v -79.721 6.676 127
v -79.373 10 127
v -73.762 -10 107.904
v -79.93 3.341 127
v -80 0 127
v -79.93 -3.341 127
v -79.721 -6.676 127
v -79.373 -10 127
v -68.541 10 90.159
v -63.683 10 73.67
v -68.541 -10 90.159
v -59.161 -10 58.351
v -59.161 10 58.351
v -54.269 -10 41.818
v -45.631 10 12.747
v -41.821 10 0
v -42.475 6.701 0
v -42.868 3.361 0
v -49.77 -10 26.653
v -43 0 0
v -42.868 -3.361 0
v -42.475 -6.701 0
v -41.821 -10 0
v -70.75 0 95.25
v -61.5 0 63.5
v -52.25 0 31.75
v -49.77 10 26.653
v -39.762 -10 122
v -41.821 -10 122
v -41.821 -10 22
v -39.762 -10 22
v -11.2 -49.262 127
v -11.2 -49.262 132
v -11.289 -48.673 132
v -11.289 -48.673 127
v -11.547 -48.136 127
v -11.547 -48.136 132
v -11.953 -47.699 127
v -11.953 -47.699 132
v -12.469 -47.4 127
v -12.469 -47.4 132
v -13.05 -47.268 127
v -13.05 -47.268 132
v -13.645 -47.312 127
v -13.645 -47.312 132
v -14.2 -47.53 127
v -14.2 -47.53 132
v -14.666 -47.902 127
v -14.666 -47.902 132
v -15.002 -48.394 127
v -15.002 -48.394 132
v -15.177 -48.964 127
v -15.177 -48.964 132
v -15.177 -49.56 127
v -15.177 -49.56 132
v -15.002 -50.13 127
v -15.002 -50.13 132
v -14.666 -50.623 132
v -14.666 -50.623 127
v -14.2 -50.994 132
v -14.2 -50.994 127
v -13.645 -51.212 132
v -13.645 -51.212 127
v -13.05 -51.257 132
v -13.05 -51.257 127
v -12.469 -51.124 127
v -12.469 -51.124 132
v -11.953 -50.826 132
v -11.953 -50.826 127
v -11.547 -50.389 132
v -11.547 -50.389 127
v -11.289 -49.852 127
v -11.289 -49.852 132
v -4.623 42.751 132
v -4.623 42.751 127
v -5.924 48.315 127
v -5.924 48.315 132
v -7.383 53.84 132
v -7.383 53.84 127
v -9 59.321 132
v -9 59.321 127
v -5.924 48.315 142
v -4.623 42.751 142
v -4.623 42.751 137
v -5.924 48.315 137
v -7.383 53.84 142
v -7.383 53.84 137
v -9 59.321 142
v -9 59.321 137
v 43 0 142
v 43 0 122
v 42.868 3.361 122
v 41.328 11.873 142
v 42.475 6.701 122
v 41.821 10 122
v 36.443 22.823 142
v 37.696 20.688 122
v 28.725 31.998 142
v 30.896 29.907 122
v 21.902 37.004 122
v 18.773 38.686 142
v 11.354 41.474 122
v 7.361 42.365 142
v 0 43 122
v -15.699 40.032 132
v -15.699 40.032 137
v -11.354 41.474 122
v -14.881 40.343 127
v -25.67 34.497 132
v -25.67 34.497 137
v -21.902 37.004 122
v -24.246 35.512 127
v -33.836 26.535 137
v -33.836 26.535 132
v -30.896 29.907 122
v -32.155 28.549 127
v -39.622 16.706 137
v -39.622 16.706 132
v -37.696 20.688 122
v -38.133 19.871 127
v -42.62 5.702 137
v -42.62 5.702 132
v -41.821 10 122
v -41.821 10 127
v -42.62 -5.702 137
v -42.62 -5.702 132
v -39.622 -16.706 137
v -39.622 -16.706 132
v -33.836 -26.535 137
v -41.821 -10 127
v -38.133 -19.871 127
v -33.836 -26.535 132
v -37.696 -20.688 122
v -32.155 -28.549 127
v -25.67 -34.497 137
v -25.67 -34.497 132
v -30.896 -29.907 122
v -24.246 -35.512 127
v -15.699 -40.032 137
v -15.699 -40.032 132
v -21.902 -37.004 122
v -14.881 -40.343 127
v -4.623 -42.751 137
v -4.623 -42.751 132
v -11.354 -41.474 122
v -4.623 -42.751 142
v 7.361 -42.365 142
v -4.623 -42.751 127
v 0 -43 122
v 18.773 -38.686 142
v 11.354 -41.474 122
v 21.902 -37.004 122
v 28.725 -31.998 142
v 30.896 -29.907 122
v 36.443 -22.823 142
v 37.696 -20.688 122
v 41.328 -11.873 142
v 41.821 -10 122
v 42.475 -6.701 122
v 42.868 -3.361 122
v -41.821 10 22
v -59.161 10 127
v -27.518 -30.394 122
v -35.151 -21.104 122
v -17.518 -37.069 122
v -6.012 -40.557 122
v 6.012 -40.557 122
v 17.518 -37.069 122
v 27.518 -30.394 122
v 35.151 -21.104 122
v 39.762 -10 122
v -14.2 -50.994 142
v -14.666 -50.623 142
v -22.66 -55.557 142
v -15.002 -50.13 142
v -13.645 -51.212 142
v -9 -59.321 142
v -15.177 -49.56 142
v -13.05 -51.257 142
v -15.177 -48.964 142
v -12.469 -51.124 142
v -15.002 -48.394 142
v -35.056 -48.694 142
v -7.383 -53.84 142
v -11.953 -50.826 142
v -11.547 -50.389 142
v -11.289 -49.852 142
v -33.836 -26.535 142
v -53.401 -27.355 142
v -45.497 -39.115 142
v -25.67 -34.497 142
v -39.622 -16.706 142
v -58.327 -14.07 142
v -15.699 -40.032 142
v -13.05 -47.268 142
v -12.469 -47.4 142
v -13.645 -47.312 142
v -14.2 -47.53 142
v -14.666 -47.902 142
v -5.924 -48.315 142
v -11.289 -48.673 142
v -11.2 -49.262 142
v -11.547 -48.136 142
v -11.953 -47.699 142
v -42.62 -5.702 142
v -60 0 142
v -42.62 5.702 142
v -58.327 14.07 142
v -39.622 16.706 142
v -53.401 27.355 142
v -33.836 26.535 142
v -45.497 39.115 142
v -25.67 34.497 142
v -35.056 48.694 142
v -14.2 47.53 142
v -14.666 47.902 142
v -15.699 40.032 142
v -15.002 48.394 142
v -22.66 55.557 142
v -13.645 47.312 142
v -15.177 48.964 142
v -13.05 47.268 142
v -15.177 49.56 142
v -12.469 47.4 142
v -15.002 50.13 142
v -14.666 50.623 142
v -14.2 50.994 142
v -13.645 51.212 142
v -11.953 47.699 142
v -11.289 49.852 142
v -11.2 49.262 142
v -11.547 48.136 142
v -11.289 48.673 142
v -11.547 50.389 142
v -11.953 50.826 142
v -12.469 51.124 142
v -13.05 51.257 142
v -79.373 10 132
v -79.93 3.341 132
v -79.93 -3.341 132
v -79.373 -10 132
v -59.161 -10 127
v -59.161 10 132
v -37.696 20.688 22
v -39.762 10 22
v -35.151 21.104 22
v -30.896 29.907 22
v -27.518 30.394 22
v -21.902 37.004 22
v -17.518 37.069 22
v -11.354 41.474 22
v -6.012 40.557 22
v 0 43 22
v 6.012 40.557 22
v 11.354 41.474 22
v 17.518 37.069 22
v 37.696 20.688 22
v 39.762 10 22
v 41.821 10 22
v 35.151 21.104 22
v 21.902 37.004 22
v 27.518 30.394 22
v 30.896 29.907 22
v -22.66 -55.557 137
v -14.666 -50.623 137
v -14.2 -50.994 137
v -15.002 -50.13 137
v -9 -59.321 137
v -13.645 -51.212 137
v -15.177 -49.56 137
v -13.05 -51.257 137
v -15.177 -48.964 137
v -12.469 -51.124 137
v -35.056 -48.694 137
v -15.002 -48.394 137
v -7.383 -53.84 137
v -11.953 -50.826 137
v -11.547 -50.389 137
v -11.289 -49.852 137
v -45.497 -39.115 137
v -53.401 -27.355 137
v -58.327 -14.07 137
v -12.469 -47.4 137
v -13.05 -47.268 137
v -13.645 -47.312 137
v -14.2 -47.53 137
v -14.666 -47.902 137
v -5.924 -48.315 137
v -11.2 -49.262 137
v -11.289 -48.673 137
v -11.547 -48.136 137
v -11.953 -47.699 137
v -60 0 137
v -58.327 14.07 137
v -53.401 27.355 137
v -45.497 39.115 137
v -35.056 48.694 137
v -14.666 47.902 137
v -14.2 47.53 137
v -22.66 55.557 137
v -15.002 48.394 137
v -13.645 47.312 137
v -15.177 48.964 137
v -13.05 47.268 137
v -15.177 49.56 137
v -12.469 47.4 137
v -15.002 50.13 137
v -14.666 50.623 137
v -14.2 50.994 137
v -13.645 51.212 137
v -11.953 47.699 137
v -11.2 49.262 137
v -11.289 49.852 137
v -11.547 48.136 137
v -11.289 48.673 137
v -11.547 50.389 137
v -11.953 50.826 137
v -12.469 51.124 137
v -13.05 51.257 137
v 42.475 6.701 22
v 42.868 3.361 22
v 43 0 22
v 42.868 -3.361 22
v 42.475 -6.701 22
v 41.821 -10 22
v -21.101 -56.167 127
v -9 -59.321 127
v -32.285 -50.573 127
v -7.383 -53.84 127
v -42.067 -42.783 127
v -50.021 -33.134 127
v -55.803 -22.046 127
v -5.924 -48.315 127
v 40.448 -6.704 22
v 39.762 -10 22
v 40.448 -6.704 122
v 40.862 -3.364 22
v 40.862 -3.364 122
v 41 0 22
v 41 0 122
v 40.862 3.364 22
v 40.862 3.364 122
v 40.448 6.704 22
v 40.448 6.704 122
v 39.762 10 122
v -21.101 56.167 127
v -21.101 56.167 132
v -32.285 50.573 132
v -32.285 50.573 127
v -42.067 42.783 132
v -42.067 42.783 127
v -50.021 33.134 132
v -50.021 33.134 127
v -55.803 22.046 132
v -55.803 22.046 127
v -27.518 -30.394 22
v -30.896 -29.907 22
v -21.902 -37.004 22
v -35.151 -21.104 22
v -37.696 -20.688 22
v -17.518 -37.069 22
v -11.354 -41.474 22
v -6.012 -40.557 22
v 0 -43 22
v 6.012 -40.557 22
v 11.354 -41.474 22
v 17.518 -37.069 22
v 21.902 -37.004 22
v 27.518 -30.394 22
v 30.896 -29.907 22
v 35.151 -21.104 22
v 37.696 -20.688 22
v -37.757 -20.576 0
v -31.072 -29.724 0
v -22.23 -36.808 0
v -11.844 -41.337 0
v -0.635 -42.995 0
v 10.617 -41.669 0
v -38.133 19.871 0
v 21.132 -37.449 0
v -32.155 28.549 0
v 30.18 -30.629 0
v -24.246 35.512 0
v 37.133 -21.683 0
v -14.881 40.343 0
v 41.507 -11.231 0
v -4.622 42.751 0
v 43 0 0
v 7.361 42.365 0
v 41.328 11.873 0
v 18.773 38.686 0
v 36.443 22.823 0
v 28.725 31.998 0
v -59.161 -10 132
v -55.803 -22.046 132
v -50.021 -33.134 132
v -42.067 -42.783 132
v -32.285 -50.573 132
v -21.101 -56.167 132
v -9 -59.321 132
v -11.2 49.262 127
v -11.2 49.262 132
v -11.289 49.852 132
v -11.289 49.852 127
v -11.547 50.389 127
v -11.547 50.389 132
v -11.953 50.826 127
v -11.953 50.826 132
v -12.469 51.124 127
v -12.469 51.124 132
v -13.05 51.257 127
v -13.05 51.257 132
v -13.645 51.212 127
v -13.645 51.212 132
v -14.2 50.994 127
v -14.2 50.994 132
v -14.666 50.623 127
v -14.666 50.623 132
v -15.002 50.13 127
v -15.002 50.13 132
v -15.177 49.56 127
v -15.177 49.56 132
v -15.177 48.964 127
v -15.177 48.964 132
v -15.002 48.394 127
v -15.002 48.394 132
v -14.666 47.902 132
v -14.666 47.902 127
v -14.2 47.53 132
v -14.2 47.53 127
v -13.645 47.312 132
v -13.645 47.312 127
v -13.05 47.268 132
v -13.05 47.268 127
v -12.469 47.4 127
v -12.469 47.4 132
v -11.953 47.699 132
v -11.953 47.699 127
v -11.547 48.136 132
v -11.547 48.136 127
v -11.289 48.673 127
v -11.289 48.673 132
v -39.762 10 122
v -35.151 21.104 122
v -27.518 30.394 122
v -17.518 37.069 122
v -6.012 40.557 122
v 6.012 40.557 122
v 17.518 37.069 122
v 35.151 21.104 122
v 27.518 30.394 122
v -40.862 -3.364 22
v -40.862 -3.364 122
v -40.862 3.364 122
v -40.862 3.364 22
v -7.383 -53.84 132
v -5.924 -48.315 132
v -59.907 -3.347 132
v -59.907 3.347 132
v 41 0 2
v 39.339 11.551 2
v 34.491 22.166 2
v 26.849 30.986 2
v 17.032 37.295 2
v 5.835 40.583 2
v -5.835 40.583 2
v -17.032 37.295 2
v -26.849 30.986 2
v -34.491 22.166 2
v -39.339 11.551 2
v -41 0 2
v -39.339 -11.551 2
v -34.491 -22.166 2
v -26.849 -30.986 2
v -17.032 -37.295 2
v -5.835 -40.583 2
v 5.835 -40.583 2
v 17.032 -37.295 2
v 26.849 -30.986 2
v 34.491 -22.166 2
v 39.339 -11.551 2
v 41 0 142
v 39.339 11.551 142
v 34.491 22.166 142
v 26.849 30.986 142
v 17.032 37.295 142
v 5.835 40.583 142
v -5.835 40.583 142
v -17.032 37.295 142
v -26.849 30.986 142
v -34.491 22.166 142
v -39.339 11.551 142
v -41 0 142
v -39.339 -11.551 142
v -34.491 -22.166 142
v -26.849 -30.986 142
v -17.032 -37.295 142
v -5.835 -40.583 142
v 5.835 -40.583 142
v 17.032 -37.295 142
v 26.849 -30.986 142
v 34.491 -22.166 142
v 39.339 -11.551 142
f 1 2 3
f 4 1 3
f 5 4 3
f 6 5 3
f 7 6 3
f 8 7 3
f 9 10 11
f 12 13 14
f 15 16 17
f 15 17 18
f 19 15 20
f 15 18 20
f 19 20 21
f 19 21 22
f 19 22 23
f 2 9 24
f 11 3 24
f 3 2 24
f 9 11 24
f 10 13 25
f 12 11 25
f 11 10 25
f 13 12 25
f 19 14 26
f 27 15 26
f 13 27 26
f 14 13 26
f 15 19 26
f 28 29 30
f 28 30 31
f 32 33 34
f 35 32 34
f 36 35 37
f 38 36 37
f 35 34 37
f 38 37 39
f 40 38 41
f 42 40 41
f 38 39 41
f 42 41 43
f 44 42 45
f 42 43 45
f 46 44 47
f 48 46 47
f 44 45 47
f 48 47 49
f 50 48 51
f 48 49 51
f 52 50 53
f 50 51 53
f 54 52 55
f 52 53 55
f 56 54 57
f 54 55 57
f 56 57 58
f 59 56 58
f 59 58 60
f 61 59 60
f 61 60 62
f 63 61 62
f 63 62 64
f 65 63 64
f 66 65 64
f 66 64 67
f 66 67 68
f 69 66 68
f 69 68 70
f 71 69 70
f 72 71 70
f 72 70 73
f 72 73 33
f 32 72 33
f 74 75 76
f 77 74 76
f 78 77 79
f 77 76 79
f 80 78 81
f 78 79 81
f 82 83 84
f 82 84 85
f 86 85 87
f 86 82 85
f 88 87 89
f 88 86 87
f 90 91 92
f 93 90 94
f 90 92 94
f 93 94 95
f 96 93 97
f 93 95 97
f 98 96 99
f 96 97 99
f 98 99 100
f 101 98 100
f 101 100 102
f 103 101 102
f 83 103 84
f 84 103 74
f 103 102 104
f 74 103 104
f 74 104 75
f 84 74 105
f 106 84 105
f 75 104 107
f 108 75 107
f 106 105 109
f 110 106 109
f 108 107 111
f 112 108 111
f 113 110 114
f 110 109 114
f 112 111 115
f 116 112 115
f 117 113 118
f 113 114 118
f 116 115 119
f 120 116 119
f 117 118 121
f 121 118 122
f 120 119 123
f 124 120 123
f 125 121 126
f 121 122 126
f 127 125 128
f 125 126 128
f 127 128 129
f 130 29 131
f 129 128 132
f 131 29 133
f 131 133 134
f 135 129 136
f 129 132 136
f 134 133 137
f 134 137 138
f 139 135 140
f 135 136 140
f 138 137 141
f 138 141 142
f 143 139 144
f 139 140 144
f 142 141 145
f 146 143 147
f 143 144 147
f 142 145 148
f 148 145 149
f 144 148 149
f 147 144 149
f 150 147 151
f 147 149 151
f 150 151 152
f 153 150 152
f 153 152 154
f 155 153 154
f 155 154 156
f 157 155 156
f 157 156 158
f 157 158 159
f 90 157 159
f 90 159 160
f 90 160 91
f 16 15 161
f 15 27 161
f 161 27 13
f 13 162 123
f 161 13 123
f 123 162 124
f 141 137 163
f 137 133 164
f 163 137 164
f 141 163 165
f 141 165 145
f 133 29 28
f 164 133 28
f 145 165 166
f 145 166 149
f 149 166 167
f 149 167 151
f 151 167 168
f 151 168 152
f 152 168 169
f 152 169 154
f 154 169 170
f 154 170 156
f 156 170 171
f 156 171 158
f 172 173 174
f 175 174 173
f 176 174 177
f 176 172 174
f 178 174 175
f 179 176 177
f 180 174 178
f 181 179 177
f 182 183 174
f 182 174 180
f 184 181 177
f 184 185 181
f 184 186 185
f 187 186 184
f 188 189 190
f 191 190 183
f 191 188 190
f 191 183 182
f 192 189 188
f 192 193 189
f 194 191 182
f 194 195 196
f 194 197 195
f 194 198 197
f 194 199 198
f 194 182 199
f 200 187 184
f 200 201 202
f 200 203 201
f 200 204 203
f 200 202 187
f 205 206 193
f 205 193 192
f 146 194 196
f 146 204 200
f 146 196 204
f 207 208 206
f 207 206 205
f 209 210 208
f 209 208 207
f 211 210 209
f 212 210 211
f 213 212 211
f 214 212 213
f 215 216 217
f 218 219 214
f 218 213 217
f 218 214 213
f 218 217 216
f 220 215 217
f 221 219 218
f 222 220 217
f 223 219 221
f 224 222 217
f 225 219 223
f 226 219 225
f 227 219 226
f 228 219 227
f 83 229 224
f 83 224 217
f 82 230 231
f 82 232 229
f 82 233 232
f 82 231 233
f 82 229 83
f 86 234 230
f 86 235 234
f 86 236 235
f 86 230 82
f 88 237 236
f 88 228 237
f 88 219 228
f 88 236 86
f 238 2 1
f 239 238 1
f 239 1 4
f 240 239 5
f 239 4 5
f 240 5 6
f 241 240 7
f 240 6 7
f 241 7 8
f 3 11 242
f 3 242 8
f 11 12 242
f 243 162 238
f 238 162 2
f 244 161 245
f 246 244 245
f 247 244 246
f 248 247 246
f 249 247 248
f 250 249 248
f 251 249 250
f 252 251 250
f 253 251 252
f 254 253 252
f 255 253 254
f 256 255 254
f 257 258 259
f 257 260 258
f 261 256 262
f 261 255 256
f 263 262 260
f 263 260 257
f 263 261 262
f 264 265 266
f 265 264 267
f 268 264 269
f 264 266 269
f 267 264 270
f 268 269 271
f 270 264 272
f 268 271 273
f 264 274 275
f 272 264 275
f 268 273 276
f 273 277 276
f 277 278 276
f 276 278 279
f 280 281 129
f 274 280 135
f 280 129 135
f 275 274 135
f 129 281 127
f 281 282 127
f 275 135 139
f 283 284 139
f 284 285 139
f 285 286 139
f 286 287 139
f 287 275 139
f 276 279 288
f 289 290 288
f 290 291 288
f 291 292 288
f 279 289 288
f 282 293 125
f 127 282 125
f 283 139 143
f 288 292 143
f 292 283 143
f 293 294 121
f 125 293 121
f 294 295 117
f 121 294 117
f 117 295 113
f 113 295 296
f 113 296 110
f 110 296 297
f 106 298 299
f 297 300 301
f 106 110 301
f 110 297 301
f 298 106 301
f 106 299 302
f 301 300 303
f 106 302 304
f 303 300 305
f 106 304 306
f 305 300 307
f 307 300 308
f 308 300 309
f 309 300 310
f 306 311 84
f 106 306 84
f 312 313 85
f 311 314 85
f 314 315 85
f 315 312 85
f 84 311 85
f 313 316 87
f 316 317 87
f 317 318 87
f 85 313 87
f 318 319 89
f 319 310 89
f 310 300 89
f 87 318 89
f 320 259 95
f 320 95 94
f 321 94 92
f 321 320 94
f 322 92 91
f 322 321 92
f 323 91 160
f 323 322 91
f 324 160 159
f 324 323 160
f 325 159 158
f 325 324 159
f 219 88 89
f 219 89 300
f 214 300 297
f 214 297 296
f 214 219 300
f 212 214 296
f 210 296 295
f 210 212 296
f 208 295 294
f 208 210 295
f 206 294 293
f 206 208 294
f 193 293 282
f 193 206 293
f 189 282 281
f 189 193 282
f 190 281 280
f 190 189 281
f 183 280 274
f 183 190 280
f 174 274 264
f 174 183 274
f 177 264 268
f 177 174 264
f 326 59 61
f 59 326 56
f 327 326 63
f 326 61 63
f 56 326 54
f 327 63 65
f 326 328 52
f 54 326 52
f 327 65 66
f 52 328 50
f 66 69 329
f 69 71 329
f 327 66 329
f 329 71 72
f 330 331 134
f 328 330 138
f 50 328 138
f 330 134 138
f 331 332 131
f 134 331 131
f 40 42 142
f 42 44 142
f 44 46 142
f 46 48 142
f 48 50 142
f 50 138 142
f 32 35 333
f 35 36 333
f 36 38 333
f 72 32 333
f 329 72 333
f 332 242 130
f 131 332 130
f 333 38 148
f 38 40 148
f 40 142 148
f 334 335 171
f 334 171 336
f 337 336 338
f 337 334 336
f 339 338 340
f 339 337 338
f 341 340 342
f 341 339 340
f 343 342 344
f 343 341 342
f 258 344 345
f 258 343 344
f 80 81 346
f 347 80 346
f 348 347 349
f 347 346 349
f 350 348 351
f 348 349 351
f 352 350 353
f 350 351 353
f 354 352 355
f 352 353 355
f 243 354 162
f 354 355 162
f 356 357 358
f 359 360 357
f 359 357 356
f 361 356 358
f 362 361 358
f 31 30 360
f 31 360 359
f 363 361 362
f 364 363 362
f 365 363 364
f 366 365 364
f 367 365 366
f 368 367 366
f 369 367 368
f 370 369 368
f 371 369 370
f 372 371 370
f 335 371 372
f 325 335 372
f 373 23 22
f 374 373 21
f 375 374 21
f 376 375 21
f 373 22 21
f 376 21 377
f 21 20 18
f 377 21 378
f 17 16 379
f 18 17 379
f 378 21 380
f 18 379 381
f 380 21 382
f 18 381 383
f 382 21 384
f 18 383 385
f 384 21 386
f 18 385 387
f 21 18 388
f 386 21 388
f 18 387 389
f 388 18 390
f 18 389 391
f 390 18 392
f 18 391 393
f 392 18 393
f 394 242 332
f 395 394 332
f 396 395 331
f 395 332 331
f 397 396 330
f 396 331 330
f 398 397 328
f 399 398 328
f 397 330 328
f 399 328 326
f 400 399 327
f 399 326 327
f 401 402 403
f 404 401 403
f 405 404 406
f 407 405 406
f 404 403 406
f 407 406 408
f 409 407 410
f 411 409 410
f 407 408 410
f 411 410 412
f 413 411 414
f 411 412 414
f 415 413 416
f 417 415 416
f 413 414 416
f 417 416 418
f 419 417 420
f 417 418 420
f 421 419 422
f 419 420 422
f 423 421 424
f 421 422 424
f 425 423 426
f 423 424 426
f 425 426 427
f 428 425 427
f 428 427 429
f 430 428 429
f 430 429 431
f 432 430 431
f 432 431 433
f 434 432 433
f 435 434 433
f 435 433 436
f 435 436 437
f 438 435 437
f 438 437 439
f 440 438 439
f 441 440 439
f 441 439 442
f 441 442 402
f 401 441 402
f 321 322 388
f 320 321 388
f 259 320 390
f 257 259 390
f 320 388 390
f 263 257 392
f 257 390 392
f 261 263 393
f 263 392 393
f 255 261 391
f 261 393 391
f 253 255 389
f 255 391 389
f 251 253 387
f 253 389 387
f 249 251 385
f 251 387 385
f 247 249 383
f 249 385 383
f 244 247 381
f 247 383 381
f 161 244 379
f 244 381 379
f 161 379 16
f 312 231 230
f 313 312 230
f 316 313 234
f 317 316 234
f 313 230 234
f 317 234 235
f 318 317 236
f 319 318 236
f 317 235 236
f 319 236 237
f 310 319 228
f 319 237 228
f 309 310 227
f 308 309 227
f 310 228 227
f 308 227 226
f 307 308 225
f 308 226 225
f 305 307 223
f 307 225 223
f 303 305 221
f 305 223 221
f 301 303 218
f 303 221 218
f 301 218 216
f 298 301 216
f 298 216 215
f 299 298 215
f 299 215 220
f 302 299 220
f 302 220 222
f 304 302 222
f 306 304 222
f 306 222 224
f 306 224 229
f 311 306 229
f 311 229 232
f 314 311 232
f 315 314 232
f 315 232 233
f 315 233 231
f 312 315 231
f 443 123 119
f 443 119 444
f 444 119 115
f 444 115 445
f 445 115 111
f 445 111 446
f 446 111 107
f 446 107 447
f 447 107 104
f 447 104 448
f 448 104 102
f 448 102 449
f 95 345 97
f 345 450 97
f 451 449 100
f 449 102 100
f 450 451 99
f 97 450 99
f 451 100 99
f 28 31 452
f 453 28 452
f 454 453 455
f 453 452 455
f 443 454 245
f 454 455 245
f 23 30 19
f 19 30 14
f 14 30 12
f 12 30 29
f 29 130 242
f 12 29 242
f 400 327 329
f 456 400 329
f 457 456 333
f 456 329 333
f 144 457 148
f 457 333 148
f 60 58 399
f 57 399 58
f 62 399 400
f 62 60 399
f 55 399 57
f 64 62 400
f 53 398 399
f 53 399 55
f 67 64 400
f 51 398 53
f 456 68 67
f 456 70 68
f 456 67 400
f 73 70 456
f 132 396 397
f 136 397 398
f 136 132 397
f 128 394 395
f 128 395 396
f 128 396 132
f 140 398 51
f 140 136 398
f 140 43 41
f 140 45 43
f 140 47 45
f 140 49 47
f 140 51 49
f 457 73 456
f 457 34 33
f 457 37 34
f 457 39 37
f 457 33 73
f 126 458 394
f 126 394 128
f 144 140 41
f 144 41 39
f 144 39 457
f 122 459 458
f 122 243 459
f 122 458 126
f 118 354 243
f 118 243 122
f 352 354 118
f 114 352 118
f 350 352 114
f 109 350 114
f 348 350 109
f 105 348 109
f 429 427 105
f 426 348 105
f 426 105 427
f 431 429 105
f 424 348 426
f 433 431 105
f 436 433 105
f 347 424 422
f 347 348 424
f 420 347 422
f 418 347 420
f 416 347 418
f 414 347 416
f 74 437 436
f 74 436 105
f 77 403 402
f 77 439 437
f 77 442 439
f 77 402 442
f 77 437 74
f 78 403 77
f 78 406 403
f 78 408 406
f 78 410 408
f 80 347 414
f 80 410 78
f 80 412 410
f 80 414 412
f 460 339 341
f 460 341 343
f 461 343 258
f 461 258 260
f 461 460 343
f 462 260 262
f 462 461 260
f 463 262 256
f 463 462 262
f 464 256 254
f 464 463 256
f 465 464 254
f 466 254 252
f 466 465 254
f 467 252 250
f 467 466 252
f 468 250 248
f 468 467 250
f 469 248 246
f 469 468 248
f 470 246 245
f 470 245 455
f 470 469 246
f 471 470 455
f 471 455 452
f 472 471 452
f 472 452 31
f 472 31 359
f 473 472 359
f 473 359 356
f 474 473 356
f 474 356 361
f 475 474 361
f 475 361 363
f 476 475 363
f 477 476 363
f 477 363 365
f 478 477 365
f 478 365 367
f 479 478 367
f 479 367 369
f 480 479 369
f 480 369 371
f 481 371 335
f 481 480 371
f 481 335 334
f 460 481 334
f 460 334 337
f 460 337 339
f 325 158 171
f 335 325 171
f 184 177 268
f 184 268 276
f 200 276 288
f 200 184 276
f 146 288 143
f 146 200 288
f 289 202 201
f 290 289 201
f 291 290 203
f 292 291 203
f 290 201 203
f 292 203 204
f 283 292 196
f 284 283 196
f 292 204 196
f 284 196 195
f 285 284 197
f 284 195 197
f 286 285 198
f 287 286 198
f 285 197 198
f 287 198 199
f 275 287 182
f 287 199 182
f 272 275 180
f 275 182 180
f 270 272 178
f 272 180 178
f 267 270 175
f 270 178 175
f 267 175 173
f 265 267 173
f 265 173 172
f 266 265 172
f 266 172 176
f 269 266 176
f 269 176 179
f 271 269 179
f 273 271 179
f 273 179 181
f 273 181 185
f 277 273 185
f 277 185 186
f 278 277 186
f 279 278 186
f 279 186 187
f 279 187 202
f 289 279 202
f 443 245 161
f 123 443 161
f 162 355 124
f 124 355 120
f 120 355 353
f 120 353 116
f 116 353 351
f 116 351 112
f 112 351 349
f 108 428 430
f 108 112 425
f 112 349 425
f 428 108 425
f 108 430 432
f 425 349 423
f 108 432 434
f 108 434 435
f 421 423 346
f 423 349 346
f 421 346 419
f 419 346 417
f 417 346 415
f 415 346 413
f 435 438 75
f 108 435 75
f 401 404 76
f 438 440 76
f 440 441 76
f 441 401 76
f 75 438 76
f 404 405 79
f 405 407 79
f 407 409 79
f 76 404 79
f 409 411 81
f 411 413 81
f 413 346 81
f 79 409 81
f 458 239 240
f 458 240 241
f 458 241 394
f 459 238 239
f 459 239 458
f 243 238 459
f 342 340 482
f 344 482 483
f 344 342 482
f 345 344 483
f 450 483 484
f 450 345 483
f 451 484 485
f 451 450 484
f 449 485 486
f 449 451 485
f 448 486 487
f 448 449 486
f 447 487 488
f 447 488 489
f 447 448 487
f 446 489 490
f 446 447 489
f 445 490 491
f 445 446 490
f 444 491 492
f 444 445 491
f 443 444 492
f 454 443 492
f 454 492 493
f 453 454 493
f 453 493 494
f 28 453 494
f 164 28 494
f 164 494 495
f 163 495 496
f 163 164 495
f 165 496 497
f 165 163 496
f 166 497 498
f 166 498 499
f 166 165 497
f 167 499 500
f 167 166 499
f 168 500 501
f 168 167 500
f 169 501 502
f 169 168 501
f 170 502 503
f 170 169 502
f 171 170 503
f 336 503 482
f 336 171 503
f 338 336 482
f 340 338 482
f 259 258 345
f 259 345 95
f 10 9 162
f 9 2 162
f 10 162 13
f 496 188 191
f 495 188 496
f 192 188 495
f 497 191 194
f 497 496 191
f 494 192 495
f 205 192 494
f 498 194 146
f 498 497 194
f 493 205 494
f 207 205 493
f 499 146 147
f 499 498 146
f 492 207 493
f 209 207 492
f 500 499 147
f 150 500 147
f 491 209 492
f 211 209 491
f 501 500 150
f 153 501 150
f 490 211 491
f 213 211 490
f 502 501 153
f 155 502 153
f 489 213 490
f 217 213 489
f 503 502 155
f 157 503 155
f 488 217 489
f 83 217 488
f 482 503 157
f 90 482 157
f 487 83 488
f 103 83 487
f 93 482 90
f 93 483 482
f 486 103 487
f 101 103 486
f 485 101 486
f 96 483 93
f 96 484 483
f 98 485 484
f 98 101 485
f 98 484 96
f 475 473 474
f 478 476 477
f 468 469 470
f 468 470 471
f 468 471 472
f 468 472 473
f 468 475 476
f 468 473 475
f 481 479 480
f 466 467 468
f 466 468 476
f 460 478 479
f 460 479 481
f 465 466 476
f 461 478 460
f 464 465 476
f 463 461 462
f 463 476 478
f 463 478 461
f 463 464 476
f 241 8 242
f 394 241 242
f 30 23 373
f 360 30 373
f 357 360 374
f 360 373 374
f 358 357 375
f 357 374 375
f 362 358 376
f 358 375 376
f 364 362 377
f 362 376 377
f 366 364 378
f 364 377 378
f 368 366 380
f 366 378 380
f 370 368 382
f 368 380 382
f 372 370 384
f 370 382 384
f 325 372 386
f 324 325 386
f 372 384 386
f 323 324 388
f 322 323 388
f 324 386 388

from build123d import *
from build123d.topology import SkipClean

# Parameters (mm, degrees)
SKETCH1_R           = 43
BOSS_EXTRUDE1_DEPTH = 2
SKETCH2_R           = 43
SKETCH2_R_2         = 41
BOSS_EXTRUDE2_DEPTH = 20
BOSS_EXTRUDE3_DEPTH = 100
SKETCH4_R           = 43
SKETCH4_R_2         = 41
BOSS_EXTRUDE4_DEPTH = 20
BOSS_EXTRUDE5_DEPTH = 5
BOSS_EXTRUDE6_DEPTH = 127
SKETCH7_W           = 7.682690019
SKETCH7_H           = 127
BOSS_EXTRUDE7_DEPTH = 5
SKETCH10_R          = 2
CUT_EXTRUDE2_DEPTH  = 15


with BuildPart() as part:
    # Sketch1 → Boss-Extrude1 (new body)
    with BuildSketch(Plane.XY):
        Circle(SKETCH1_R)
    extrude(amount=BOSS_EXTRUDE1_DEPTH)

    # Sketch2 → Boss-Extrude2 (add)
    with BuildSketch(Plane.XY.offset(2)):
        Circle(SKETCH2_R)
        Circle(SKETCH2_R_2, mode=Mode.SUBTRACT)
    extrude(amount=BOSS_EXTRUDE2_DEPTH)

    # Sketch3 → Boss-Extrude3 (add)
    with SkipClean():  # the faces are left unmerged after this step: merging them gives an invalid solid
        with BuildSketch(Plane.XY.offset(22)):
            with BuildLine():
                Line((39.761790704, 10), (41.821047333, 10))
                ThreePointArc((41.821047333, 10), (43, 0), (41.821047333, -10))
                Line((41.821047333, -10), (39.761790704, -10))
                ThreePointArc((39.761790704, -10), (41, 0), (39.761790704, 10))
            make_face()
            with BuildLine():
                Line((-41.821047333, -10), (-39.761790704, -10))
                ThreePointArc((-39.761790704, -10), (-41, 0), (-39.761790704, 10))
                Line((-39.761790704, 10), (-41.821047333, 10))
                ThreePointArc((-41.821047333, 10), (-43, 0), (-41.821047333, -10))
            make_face()
        extrude(amount=BOSS_EXTRUDE3_DEPTH)

    # Sketch4 → Boss-Extrude4 (add)
    with SkipClean():  # the faces are left unmerged after this step: merging them gives an invalid solid
        with BuildSketch(Plane.XY.offset(122)):
            Circle(SKETCH4_R)
            Circle(SKETCH4_R_2, mode=Mode.SUBTRACT)
        extrude(amount=BOSS_EXTRUDE4_DEPTH)

    # Sketch5 → Boss-Extrude5 (add)
    with SkipClean():  # the faces are left unmerged after this step: merging them gives an invalid solid
        with BuildSketch(Plane.XY.offset(142)):
            with BuildLine():
                ThreePointArc((-4.6225, 42.750818633), (-6.633671033, 51.082901463), (-9, 59.3211598))
                ThreePointArc((-9, 59.3211598), (-60, 0), (-9, -59.3211598))
                ThreePointArc((-9, -59.3211598), (-6.633671033, -51.082901463), (-4.6225, -42.750818633))
                ThreePointArc((-4.6225, -42.750818633), (-43, 0), (-4.6225, 42.750818633))
            make_face()
        boss_extrude5 = extrude(amount=-BOSS_EXTRUDE5_DEPTH)

    # Mirror1: Boss-Extrude5 across plane
    with SkipClean():  # the faces are left unmerged after this step: merging them gives an invalid solid
        add(boss_extrude5.mirror(Plane(origin=(0, 0, 134.5), x_dir=(1, 0, 0), z_dir=(0, 0, -1))))

    # Sketch6 → Boss-Extrude6 (add)
    with SkipClean():  # the faces are left unmerged after this step: merging them gives an invalid solid
        with BuildSketch(Plane(origin=(0, 0, 127), x_dir=(-1, 0, 0), z_dir=(0, 0, -1))):
            with BuildLine():
                ThreePointArc((43, 0), (42.704244726, -5.034628323), (41.821047333, -10))
                Line((41.821047333, -10), (59.160797831, -10))
                ThreePointArc((59.160797831, -10), (59.789831367, -5.017575617), (60, 0))
                ThreePointArc((60, 0), (59.789831367, 5.017575617), (59.160797831, 10))
                Line((59.160797831, 10), (41.821047333, 10))
                ThreePointArc((41.821047333, 10), (42.704244726, 5.034628323), (43, 0))
            make_face()
            with BuildLine():
                ThreePointArc((60, 0), (59.789831367, -5.017575617), (59.160797831, -10))
                Line((59.160797831, -10), (80, -10))
                Line((80, -10), (80, 10))
                Line((80, 10), (59.160797831, 10))
                ThreePointArc((59.160797831, 10), (59.789831367, 5.017575617), (60, 0))
            make_face()
        extrude(amount=BOSS_EXTRUDE6_DEPTH)

    # Sketch7 → Cut-Revolve1 (revolve, cut)
    with SkipClean():  # the faces are left unmerged after this step: merging them gives an invalid solid
        with BuildSketch(Plane(origin=(0, 0, 0), x_dir=(1, 0, 0), z_dir=(0, 1, 0)), mode=Mode.PRIVATE) as cut_revolve1_sk:
            with Locations((-83.84134501, -63.5)):
                Rectangle(SKETCH7_W, SKETCH7_H)
            Polygon((-80, 0), (-80, -127), (-43, 0), align=None)
        revolve(cut_revolve1_sk.sketch.rotate(Axis((0, 0, -46.383399508), (0, 0, 1)), 276.171221478), axis=Axis((0, 0, -46.383399508), (0, 0, 1)), mode=Mode.SUBTRACT)

    # Sketch8 → Boss-Extrude7 (add)
    with SkipClean():  # the faces are left unmerged after this step: merging them gives an invalid solid
        with BuildSketch(Plane.XY.offset(127)):
            with BuildLine():
                Line((-59.160797831, 10), (-79.372539332, 10))
                ThreePointArc((-79.372539332, 10), (-80, 0), (-79.372539332, -10))
                Line((-79.372539332, -10), (-59.160797831, -10))
                ThreePointArc((-59.160797831, -10), (-60, 0), (-59.160797831, 10))
            make_face()
        extrude(amount=BOSS_EXTRUDE7_DEPTH)

    # Sketch10 → Cut-Extrude2 (cut)
    with SkipClean():  # the faces are left unmerged after this step: merging them gives an invalid solid
        with BuildSketch(Plane.XY.offset(142)):
            with Locations((-13.1997713, 49.262217141)):
                Circle(SKETCH10_R)
            with Locations((-13.1997713, -49.262217141)):
                Circle(SKETCH10_R)
        extrude(amount=-CUT_EXTRUDE2_DEPTH, mode=Mode.SUBTRACT)


solid = part.part
